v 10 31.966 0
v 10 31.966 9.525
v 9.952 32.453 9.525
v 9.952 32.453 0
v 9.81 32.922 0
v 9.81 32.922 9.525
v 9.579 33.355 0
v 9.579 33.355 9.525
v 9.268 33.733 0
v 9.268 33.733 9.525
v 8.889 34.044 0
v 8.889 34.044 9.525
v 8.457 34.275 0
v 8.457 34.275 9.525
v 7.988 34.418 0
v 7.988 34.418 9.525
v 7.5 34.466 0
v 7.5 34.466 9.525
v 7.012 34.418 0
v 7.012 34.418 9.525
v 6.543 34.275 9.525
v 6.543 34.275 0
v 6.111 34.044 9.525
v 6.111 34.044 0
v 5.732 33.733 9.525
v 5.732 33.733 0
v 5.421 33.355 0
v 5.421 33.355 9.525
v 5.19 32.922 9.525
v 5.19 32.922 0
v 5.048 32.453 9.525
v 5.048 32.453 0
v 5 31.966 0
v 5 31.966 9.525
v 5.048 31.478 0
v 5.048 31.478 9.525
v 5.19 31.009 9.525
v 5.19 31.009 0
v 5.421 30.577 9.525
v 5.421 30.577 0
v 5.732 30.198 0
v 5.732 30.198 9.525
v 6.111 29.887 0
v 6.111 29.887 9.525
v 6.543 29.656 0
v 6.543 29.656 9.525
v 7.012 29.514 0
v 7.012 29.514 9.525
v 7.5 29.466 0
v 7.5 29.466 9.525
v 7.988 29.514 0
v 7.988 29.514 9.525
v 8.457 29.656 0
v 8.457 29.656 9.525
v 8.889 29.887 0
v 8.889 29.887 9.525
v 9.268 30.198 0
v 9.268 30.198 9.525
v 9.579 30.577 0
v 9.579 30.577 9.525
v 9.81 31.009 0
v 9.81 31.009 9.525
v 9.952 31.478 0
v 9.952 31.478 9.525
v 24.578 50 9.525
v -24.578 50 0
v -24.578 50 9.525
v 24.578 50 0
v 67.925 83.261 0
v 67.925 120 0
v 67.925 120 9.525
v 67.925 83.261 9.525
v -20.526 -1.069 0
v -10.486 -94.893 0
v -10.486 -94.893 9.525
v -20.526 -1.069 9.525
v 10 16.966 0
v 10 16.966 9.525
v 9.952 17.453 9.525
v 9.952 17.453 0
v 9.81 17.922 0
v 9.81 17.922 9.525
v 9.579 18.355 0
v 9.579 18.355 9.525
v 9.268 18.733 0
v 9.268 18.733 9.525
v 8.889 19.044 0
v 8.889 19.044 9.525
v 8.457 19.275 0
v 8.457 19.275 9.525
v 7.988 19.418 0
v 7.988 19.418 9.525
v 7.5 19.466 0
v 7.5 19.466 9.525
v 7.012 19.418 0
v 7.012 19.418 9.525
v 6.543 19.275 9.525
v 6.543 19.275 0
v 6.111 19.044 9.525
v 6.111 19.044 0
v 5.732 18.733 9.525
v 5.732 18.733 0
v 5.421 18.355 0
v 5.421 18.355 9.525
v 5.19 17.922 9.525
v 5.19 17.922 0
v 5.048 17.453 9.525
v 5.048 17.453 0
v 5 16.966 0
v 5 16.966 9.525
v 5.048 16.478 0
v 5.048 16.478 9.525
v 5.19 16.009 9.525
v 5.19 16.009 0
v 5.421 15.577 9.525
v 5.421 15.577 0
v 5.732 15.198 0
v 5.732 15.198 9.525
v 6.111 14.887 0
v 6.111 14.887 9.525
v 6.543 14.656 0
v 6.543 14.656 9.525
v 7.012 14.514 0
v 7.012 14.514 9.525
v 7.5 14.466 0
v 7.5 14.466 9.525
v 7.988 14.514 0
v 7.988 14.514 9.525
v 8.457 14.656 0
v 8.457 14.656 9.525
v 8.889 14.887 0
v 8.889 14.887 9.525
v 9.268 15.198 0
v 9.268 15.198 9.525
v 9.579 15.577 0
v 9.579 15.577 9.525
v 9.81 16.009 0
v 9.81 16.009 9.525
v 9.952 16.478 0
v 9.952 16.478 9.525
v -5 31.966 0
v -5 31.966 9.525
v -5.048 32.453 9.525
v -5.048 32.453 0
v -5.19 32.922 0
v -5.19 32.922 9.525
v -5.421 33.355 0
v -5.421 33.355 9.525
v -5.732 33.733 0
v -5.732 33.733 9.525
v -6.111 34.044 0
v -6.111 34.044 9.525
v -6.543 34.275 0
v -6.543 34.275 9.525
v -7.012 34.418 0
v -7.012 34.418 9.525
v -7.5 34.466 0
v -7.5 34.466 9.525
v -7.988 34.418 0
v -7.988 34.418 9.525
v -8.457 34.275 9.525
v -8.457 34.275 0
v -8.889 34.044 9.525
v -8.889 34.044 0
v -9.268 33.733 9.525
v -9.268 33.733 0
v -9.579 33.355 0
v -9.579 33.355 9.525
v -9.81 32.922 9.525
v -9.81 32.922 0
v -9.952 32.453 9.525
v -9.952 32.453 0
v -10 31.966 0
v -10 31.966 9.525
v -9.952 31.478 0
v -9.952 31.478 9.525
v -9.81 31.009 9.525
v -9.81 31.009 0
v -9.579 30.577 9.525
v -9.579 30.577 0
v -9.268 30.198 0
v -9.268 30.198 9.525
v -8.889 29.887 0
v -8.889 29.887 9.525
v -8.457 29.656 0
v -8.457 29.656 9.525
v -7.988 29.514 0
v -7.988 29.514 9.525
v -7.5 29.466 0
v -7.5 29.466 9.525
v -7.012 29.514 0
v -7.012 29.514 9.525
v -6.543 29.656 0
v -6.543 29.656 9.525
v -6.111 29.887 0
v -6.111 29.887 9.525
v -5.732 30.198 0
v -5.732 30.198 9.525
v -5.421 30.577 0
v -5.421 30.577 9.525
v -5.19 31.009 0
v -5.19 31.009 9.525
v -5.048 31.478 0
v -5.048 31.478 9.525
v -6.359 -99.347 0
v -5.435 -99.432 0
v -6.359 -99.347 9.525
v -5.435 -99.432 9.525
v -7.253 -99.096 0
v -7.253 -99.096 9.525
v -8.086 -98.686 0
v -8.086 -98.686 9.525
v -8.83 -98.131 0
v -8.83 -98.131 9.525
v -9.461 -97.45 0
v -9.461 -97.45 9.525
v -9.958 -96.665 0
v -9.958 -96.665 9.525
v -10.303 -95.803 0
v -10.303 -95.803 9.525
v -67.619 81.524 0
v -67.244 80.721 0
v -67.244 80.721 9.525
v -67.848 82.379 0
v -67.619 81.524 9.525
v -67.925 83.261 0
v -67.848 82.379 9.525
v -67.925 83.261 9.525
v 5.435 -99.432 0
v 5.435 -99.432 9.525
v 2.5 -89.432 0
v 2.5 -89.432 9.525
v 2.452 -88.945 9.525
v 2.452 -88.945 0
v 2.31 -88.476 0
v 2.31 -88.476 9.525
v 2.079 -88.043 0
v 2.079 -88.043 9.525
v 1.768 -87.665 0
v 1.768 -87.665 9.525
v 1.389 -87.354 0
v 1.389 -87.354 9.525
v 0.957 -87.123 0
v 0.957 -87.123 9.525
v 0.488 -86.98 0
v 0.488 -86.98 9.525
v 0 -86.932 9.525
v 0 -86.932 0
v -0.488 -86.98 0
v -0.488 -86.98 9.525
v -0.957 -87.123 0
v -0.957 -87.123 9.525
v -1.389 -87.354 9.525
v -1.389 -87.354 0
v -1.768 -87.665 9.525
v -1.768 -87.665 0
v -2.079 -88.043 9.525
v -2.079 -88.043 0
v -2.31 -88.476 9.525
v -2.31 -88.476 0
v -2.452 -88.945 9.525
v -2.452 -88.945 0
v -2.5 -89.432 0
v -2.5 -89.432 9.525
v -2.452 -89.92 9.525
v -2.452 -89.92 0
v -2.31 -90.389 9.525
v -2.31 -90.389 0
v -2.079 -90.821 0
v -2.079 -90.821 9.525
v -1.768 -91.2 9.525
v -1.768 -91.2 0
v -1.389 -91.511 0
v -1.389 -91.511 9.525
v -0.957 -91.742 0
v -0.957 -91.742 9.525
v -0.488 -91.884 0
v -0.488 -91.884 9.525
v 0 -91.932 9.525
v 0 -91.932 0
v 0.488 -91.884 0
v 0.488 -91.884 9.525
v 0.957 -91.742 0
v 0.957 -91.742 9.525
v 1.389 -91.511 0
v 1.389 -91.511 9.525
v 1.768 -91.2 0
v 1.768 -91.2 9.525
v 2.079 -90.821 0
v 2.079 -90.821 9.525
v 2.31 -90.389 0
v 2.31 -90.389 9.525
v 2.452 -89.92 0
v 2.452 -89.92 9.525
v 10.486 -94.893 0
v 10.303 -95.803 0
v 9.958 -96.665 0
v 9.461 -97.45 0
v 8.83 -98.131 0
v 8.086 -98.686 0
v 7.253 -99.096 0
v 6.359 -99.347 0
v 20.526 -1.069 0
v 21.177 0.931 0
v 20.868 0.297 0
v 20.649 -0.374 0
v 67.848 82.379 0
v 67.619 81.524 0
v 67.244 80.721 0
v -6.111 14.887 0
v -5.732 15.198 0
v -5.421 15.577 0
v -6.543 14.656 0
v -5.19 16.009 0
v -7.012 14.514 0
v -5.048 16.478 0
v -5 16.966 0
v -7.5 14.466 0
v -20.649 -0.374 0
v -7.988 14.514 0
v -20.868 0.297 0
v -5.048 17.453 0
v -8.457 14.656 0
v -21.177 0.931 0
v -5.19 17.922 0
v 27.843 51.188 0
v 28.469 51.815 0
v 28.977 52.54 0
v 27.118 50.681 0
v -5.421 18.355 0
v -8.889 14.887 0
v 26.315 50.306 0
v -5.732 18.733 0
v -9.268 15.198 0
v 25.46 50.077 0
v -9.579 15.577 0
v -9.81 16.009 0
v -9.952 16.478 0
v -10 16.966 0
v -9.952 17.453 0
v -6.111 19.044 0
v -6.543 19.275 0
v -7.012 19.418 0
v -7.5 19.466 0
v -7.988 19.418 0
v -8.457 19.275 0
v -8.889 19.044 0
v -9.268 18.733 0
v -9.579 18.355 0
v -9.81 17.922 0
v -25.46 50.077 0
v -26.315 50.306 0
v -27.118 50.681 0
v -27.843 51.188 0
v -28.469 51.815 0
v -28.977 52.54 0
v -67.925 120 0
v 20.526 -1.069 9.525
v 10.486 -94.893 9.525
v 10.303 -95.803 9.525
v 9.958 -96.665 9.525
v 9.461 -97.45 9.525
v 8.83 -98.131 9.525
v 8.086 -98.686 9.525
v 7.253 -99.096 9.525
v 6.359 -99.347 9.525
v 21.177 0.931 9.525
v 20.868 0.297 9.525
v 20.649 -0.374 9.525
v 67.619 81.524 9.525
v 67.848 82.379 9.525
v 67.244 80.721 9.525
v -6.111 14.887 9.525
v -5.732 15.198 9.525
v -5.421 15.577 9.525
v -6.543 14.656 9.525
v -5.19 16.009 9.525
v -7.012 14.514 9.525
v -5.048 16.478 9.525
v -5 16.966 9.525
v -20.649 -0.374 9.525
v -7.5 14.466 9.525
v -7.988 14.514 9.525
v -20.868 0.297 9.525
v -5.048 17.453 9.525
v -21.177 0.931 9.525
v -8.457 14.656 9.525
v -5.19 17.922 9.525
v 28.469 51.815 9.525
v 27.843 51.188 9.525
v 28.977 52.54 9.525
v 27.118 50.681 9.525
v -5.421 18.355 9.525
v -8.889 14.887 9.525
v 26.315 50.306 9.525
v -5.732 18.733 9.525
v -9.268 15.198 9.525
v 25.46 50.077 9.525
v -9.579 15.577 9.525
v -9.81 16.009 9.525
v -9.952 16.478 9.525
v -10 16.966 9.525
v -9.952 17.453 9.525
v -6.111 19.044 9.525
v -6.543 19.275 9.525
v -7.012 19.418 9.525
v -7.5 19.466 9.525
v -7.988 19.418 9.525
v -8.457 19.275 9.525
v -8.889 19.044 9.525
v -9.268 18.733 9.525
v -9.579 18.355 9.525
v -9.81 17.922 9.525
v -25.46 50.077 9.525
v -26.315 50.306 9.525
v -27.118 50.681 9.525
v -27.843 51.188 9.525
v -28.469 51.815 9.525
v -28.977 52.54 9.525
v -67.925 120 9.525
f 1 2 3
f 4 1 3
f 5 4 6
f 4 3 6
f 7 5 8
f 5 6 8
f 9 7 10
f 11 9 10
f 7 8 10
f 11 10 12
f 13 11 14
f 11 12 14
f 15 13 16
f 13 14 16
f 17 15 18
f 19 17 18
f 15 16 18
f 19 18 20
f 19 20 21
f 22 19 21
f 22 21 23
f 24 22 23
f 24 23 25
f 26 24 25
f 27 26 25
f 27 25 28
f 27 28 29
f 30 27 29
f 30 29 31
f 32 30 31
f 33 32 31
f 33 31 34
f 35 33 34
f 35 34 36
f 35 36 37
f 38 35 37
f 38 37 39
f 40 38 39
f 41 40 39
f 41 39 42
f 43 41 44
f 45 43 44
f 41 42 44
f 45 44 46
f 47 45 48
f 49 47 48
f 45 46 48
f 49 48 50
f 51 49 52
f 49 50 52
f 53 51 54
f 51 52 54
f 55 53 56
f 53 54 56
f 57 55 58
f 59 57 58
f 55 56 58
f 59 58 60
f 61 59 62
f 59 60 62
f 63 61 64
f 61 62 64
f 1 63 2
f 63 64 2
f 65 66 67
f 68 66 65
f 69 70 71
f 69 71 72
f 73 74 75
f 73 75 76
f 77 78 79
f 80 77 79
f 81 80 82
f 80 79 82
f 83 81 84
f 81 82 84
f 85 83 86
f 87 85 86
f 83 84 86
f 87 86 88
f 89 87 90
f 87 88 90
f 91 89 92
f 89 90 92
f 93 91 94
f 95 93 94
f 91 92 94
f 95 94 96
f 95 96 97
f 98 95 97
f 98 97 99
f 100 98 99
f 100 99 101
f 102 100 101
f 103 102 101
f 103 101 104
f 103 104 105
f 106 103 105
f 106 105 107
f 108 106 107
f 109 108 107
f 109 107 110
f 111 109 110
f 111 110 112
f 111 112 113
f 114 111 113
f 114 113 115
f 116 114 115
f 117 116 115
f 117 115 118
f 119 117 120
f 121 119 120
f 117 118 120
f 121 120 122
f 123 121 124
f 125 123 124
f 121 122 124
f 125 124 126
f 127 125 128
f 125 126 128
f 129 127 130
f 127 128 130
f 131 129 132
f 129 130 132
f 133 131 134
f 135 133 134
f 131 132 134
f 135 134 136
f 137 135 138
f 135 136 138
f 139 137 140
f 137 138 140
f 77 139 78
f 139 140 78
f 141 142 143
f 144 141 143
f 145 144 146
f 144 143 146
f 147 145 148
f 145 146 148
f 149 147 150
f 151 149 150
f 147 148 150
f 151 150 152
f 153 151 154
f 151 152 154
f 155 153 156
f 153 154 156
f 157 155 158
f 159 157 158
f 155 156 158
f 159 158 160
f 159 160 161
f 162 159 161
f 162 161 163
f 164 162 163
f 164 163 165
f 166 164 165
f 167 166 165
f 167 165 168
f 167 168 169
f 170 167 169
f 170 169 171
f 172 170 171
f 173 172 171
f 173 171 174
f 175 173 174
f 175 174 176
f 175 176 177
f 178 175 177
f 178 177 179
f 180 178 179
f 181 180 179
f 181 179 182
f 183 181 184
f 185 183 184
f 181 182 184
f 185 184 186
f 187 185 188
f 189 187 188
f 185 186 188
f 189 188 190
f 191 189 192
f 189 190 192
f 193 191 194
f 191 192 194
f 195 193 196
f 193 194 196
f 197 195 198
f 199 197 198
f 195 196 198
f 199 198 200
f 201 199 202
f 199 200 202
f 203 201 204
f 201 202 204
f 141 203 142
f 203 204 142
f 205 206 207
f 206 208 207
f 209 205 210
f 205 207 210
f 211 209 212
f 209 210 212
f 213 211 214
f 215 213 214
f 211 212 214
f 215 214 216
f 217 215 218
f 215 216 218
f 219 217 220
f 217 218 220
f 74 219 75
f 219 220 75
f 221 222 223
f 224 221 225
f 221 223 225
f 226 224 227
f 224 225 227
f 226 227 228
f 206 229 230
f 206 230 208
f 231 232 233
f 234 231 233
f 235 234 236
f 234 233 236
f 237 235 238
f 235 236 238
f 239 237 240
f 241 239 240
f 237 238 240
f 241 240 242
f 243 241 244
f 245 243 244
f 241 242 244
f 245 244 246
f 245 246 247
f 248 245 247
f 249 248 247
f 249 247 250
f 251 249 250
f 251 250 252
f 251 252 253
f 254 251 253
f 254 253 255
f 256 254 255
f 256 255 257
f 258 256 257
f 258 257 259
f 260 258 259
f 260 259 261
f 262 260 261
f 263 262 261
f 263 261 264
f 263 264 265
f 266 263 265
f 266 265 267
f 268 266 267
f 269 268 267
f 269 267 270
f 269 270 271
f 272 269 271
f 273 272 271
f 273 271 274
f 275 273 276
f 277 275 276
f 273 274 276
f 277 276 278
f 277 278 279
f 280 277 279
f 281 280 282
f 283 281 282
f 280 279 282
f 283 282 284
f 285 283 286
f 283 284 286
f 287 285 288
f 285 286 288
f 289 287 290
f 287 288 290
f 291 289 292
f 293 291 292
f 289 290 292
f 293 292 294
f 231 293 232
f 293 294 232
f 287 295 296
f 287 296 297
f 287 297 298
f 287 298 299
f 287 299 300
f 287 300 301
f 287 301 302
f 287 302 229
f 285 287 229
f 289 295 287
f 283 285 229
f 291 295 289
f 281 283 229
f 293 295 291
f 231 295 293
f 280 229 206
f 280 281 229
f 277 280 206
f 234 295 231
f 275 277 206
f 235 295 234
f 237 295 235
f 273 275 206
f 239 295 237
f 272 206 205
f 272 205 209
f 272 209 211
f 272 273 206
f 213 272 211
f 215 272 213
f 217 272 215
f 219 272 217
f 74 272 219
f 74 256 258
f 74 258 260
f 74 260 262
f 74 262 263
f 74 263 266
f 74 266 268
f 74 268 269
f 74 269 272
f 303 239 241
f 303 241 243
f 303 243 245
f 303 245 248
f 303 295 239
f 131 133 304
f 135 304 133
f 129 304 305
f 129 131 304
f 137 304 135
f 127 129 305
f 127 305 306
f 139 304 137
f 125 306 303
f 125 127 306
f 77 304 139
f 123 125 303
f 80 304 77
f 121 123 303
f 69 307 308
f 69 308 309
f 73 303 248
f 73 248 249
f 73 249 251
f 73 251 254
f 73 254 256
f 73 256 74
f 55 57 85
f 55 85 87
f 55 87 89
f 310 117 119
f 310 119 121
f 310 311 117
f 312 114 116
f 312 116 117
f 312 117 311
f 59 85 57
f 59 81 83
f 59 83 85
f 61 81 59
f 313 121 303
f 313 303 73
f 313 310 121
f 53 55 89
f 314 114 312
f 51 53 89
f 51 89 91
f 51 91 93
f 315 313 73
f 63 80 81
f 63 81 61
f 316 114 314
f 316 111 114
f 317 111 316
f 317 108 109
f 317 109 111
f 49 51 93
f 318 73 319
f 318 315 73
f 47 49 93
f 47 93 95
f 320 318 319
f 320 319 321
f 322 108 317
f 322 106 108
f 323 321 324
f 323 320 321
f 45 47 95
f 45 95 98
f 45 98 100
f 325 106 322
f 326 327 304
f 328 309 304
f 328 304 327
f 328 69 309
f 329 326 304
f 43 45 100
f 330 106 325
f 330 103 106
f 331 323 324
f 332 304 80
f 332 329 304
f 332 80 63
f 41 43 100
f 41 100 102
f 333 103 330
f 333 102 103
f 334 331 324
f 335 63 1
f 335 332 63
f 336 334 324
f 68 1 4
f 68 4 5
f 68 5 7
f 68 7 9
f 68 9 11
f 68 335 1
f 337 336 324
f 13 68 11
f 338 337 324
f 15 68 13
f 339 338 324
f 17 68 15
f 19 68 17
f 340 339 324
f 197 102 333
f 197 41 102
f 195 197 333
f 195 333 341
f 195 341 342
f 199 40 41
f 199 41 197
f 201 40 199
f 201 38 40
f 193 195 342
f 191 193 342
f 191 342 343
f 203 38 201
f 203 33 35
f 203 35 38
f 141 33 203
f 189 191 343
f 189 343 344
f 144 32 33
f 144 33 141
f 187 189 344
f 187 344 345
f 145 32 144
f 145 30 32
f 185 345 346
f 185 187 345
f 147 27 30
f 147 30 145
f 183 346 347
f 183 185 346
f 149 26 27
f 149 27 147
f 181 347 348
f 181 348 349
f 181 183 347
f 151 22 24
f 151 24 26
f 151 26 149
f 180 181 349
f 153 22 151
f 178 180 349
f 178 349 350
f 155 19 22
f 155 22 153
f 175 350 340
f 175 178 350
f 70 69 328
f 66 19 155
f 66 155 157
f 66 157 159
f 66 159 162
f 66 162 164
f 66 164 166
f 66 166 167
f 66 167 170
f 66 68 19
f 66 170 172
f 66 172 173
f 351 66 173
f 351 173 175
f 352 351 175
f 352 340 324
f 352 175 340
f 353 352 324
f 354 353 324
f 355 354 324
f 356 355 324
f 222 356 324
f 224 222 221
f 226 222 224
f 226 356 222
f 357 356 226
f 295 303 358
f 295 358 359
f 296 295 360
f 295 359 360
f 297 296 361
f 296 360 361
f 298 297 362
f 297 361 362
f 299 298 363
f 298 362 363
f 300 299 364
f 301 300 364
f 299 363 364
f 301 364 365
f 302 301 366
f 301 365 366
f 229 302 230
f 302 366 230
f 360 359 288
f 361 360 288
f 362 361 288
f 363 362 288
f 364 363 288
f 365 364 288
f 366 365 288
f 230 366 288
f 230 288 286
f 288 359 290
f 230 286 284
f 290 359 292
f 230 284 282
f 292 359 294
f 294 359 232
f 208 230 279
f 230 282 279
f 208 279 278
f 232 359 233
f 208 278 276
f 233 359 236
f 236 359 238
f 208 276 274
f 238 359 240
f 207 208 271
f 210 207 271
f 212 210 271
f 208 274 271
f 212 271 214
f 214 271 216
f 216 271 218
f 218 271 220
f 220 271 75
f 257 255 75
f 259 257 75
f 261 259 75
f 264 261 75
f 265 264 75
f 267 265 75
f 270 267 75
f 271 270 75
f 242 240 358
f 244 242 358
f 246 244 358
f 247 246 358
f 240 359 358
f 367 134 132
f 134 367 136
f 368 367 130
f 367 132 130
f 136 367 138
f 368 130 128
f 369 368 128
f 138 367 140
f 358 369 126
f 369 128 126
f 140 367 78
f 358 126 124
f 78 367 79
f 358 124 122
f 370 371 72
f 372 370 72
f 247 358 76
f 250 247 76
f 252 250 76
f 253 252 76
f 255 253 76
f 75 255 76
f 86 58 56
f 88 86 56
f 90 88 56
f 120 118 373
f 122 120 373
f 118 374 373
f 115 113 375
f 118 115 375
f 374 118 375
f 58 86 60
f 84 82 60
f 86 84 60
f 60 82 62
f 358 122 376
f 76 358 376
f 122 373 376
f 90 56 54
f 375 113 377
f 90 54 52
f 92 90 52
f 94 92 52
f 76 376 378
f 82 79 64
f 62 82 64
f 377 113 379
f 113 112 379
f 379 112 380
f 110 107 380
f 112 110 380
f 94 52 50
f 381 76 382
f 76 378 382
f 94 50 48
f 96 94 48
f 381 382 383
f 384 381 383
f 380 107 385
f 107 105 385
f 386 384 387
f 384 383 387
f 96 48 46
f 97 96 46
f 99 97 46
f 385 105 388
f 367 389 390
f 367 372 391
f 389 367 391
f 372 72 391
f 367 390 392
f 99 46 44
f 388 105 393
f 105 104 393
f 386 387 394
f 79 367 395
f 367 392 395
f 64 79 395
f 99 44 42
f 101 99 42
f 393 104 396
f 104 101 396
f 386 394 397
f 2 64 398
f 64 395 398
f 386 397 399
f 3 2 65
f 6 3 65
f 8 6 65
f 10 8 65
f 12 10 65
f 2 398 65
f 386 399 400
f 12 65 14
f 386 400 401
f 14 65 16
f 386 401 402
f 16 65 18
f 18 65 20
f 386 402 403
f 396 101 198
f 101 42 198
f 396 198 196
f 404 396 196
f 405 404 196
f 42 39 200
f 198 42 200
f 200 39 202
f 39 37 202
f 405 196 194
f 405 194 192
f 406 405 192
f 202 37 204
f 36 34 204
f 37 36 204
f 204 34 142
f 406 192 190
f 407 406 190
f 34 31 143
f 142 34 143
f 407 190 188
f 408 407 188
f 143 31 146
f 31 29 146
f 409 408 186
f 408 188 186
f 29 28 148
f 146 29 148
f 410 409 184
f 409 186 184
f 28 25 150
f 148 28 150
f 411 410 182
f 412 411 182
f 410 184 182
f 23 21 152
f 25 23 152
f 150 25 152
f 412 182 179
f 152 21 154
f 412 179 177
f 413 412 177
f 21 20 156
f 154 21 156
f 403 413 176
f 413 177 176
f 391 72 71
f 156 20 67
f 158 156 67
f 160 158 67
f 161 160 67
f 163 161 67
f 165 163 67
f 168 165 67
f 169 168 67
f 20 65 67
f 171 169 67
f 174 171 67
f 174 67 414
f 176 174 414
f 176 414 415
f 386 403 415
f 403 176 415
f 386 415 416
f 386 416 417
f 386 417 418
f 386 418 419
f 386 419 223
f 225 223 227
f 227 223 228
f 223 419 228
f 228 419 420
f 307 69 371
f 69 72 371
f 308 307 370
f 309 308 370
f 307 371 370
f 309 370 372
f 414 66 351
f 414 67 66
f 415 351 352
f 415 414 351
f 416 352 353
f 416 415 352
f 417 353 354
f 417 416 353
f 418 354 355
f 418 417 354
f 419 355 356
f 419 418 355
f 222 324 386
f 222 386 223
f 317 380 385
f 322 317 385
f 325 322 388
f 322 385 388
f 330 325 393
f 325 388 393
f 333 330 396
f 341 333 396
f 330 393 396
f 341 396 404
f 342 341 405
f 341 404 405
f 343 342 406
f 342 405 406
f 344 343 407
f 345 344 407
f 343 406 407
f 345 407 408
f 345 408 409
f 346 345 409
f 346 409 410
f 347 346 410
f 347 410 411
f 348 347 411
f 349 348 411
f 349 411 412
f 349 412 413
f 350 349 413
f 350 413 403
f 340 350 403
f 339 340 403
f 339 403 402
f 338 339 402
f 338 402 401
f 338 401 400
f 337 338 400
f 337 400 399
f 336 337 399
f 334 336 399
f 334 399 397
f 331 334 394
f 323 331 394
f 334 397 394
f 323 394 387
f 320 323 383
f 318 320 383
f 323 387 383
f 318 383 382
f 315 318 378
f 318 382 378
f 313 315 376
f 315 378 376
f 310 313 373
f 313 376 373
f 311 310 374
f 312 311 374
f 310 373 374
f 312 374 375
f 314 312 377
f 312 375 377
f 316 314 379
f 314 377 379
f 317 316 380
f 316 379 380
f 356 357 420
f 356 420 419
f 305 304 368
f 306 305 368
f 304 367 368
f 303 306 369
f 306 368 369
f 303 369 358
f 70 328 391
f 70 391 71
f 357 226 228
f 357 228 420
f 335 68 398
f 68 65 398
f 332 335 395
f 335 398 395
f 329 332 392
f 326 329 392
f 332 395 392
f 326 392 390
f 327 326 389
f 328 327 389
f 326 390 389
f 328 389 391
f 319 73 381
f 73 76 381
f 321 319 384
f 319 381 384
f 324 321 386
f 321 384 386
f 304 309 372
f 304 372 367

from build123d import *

# Parameters (mm, degrees)
BOSS_EXTRUDE1_DEPTH   = 9.525
FILLET1_R             = 5.08
F_5_0MM_DOWEL_HOLE1_D = 5
SKETCH14_R            = 2.5
CUT_EXTRUDE1_DEPTH    = 139.21913576


with BuildPart() as part:
    # Sketch1 → Boss-Extrude1 (new body)
    with BuildSketch(Plane.XY):
        Polygon((-27.510468203, 50), (27.510468203, 50), (67.924987047, 120), (67.924987047, 81.9), (20.64, 0), (10, -99.432340815), (-10, -99.432340815), (-20.64, 0), (-67.924987047, 81.9), (-67.924987047, 120), align=None)
    extrude(amount=BOSS_EXTRUDE1_DEPTH)

    # Fillet1
    fillet1_edges = [part.edges().sort_by_distance(p)[0] for p in [
        (-27.510468203, 50, 4.7625),
        (27.510468203, 50, 4.7625),
        (67.924987047, 81.9, 4.7625),
        (20.64, 0, 4.7625),
        (10, -99.432340815, 4.7625),
        (-10, -99.432340815, 4.7625),
        (-20.64, 0, 4.7625),
        (-67.924987047, 81.9, 4.7625),
    ]]
    fillet(fillet1_edges, radius=FILLET1_R)

    # Ø5.0mm Dowel Hole1 (through all)
    with Locations(Plane(origin=(0, 0, 0), x_dir=(-1, 0, 0), z_dir=(0, 0, -1))):
        with Locations((-7.5, 31.965654583), (7.5, 31.965654583), (-7.5, 16.965654583), (7.5, 16.965654583)):
            Hole(F_5_0MM_DOWEL_HOLE1_D / 2)

    # Sketch14 → Cut-Extrude1 (cut, through all)
    with BuildSketch(Plane.XY.offset(9.525)):
        with Locations((0, -89.432340815)):
            Circle(SKETCH14_R)
    extrude(amount=-CUT_EXTRUDE1_DEPTH, mode=Mode.SUBTRACT)


solid = part.part
